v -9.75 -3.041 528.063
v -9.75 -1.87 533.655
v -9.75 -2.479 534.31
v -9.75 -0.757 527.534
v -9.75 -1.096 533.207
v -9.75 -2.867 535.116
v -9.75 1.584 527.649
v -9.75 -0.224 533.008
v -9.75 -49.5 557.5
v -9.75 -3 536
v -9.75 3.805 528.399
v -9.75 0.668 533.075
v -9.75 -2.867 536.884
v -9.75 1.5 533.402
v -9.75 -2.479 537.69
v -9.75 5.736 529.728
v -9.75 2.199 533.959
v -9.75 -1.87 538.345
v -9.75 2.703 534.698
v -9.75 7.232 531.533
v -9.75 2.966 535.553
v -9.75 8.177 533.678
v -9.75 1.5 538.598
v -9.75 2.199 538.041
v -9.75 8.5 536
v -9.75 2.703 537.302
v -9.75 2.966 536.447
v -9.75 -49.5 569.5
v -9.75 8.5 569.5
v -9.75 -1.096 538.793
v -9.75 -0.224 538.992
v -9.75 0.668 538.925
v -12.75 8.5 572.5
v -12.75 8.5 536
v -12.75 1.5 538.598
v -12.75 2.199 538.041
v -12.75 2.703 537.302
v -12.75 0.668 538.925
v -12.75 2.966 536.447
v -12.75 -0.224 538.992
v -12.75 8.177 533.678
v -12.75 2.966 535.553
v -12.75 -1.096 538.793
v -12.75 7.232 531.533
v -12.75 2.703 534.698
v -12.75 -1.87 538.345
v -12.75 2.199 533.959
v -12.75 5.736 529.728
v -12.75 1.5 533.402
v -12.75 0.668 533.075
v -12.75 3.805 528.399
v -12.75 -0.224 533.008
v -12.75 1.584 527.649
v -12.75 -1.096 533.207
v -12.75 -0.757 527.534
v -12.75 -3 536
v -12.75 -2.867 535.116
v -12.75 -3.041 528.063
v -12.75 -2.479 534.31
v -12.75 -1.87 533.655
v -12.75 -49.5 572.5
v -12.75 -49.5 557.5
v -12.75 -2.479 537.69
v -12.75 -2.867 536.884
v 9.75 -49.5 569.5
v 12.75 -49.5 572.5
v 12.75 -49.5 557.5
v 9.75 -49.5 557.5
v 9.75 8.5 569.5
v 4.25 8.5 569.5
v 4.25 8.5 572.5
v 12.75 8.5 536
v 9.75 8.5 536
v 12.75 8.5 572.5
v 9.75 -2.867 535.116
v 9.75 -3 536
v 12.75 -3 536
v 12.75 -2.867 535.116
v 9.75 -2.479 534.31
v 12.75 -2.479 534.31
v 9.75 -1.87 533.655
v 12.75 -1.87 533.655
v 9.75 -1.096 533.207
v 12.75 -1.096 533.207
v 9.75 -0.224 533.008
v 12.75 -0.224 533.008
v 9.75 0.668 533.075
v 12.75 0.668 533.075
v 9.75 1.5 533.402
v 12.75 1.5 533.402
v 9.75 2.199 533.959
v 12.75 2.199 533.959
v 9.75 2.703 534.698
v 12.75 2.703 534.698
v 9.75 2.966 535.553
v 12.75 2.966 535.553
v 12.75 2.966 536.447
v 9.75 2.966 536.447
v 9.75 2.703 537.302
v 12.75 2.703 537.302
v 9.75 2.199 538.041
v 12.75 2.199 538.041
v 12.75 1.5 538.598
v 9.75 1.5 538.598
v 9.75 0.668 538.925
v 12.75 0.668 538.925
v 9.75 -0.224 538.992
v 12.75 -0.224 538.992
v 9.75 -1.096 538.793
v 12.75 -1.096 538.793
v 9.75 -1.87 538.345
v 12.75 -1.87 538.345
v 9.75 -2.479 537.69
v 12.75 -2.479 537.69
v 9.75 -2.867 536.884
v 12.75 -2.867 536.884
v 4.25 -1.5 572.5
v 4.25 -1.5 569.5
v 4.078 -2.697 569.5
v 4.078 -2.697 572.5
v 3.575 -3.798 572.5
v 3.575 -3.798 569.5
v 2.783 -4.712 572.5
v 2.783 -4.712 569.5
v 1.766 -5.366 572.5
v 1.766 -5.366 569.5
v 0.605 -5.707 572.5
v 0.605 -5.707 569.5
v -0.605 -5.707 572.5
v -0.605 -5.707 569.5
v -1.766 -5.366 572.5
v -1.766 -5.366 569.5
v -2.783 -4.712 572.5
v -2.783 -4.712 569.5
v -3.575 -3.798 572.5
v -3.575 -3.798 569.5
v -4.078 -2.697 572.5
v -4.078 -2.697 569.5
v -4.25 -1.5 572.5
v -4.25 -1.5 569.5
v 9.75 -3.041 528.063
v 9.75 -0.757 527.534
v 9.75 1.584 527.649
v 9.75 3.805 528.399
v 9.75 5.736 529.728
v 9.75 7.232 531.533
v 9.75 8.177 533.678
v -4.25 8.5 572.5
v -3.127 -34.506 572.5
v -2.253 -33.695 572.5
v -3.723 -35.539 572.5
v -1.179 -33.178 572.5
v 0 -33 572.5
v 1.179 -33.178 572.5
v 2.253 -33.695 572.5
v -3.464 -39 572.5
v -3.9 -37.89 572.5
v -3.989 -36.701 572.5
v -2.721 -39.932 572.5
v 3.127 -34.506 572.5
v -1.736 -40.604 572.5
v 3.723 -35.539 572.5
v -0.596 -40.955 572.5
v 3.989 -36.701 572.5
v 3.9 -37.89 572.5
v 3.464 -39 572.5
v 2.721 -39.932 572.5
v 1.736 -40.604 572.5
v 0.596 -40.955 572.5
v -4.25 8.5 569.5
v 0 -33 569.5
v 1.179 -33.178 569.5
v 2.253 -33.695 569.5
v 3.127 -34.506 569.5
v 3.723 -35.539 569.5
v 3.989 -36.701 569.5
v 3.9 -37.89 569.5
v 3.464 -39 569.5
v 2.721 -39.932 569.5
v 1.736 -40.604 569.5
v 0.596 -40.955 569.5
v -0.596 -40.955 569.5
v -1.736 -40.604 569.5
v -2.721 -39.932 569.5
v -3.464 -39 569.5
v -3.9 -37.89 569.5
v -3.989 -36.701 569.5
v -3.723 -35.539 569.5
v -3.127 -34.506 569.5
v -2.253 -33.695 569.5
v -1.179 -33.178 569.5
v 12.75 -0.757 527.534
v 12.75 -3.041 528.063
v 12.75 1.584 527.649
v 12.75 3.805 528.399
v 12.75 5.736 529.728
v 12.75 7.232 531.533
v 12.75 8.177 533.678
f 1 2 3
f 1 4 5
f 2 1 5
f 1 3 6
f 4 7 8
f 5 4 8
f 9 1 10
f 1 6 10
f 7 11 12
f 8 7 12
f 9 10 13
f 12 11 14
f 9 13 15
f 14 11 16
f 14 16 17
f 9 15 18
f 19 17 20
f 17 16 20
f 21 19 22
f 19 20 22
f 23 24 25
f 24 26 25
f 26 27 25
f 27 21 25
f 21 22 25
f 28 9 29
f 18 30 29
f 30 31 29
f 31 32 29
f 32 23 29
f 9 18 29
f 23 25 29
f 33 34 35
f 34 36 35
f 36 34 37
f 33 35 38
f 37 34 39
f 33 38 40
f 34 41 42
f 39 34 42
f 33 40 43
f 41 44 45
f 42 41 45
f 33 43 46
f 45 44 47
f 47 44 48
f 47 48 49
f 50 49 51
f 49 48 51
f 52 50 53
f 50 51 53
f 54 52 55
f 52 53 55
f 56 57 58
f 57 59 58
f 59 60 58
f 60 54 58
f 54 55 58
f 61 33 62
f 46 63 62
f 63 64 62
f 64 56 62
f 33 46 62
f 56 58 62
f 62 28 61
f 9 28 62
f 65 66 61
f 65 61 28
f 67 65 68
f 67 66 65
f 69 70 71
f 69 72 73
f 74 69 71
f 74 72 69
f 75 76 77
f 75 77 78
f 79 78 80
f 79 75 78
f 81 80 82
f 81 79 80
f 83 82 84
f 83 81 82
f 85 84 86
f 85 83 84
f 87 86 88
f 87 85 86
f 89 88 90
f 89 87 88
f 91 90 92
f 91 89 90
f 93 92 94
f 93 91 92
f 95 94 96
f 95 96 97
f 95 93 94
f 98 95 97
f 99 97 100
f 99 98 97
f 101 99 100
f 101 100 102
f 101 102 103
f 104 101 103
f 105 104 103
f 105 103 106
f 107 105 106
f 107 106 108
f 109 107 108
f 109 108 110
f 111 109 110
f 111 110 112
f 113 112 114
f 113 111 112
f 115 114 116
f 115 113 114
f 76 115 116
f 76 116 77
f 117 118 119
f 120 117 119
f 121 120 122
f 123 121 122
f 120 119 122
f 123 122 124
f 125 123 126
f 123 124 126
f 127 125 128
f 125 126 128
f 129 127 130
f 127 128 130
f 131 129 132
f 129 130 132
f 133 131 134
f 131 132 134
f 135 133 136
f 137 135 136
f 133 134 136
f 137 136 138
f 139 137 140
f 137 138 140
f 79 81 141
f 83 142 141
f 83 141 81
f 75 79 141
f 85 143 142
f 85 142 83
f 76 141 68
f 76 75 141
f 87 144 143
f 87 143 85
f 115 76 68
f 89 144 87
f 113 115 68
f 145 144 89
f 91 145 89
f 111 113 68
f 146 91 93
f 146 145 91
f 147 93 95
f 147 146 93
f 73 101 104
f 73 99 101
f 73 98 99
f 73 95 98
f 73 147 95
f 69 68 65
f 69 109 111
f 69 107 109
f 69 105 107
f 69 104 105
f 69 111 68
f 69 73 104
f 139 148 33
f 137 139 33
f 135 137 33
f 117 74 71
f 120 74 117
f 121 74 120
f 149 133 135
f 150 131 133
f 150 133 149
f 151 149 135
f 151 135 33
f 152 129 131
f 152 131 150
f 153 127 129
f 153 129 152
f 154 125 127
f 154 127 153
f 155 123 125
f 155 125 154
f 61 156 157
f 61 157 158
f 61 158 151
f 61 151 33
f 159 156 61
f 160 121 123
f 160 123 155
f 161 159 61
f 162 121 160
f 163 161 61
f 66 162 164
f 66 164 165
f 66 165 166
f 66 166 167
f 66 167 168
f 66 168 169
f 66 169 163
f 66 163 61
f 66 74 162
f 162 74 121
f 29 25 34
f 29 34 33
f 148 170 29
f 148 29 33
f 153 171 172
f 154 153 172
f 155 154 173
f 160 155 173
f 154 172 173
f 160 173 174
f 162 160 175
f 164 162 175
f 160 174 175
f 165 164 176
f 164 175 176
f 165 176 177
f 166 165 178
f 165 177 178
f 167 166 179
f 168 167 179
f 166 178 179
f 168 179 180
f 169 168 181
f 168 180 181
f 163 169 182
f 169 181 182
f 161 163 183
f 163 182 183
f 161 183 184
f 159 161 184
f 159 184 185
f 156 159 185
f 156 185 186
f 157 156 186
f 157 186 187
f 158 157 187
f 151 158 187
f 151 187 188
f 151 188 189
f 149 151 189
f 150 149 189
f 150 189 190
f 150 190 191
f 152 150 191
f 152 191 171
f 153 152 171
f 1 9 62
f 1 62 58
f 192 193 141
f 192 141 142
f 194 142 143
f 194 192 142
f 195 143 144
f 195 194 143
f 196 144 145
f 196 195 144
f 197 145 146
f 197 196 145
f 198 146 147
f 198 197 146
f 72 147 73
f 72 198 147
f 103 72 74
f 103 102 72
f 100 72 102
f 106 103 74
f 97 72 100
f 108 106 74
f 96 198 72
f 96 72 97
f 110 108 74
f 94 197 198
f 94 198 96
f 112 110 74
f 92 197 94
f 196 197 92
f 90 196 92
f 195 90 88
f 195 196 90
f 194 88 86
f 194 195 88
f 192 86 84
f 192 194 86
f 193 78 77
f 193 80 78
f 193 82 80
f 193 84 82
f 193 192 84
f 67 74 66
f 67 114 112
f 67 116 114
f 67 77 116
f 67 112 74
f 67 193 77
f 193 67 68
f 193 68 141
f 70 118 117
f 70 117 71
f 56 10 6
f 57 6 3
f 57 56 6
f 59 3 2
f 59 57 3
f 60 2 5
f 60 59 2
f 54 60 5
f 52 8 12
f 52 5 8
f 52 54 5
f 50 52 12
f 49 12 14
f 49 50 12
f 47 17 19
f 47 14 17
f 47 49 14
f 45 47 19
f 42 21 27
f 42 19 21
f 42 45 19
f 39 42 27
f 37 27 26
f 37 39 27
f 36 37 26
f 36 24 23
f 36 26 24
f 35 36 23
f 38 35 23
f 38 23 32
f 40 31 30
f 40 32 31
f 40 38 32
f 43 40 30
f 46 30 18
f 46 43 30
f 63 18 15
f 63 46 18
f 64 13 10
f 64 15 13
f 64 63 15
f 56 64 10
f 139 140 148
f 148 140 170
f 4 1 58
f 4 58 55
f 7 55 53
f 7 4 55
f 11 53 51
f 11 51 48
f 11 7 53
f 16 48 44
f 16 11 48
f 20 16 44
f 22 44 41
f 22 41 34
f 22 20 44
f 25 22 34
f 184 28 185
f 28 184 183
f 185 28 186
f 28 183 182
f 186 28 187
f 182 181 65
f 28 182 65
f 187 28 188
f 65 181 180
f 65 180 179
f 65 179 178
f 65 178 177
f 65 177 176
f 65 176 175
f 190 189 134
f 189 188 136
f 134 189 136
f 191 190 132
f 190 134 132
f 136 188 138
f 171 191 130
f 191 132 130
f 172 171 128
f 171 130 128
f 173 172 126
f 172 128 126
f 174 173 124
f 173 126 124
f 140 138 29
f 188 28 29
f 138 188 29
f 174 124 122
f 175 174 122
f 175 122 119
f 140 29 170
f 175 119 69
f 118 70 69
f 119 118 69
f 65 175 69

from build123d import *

# Parameters (mm, degrees)
SKETCH012_R             = 3
PAD007_DEPTH            = 12.75
SKETCH013_W             = 45
SKETCH013_H             = 19.5
POCKET004_DEPTH         = 58.001
SKETCH014_R             = 4
POCKET005_DEPTH         = 3.001
BODY003_ROLL_ANGLE      = 180
BODY003_PLACEMENT_ANGLE = -90


with BuildPart() as part:
    # Sketch012 → Pad007 (new body, symmetric)
    with BuildSketch(Plane.XZ):
        with BuildLine():
            Line((-8.5, 0), (-8.5, -36.5))
            Line((-8.5, -36.5), (49.5, -36.5))
            Line((49.5, -36.5), (49.5, -21.5))
            Line((49.5, -21.5), (3.040993, 7.937403))
            ThreePointArc((3.040993, 7.937403), (-4.816719, 7.003515), (-8.5, 0))
        make_face()
        Circle(SKETCH012_R, mode=Mode.SUBTRACT)
    extrude(amount=PAD007_DEPTH, both=True)

    # Sketch013 (on Face1 of Pad007) → Pocket004 (cut, through all)
    with BuildSketch(Plane(origin=(-8.5, 0, 0), x_dir=(0, 0, -1), z_dir=(-1, 0, 0))):
        with Locations((11, 0)):
            Rectangle(SKETCH013_W, SKETCH013_H)
    extrude(amount=-POCKET004_DEPTH, mode=Mode.SUBTRACT)

    # Sketch014 (on Face7 of Pocket004) → Pocket005 (cut, through all)
    with BuildSketch(Plane(origin=(0, 0, -33.5), x_dir=(-1, 0, 0), z_dir=(0, 0, 1))):
        with Locations((-37, 0)):
            Circle(SKETCH014_R)
        with BuildLine():
            Line((-1.5, 4.25), (8.5, 4.25))
            Line((8.5, 4.25), (8.5, -4.25))
            Line((-1.5, -4.25), (8.5, -4.25))
            ThreePointArc((-1.5, 4.25), (-5.75, 0), (-1.5, -4.25))
        make_face()
    extrude(amount=-POCKET005_DEPTH, mode=Mode.SUBTRACT)


with BuildPart() as part_1:
    # Body003 roll: moved
    add(part.part.rotate(Axis((0, 0, 0), (1, 0, 0)), BODY003_ROLL_ANGLE))


with BuildPart() as part_2:
    # Body003 placement: moved
    add(part_1.part.moved(Location((0, 0, 536))).rotate(Axis((0, 0, 536), (0, 0, 1)), BODY003_PLACEMENT_ANGLE))


solid = part_2.part
